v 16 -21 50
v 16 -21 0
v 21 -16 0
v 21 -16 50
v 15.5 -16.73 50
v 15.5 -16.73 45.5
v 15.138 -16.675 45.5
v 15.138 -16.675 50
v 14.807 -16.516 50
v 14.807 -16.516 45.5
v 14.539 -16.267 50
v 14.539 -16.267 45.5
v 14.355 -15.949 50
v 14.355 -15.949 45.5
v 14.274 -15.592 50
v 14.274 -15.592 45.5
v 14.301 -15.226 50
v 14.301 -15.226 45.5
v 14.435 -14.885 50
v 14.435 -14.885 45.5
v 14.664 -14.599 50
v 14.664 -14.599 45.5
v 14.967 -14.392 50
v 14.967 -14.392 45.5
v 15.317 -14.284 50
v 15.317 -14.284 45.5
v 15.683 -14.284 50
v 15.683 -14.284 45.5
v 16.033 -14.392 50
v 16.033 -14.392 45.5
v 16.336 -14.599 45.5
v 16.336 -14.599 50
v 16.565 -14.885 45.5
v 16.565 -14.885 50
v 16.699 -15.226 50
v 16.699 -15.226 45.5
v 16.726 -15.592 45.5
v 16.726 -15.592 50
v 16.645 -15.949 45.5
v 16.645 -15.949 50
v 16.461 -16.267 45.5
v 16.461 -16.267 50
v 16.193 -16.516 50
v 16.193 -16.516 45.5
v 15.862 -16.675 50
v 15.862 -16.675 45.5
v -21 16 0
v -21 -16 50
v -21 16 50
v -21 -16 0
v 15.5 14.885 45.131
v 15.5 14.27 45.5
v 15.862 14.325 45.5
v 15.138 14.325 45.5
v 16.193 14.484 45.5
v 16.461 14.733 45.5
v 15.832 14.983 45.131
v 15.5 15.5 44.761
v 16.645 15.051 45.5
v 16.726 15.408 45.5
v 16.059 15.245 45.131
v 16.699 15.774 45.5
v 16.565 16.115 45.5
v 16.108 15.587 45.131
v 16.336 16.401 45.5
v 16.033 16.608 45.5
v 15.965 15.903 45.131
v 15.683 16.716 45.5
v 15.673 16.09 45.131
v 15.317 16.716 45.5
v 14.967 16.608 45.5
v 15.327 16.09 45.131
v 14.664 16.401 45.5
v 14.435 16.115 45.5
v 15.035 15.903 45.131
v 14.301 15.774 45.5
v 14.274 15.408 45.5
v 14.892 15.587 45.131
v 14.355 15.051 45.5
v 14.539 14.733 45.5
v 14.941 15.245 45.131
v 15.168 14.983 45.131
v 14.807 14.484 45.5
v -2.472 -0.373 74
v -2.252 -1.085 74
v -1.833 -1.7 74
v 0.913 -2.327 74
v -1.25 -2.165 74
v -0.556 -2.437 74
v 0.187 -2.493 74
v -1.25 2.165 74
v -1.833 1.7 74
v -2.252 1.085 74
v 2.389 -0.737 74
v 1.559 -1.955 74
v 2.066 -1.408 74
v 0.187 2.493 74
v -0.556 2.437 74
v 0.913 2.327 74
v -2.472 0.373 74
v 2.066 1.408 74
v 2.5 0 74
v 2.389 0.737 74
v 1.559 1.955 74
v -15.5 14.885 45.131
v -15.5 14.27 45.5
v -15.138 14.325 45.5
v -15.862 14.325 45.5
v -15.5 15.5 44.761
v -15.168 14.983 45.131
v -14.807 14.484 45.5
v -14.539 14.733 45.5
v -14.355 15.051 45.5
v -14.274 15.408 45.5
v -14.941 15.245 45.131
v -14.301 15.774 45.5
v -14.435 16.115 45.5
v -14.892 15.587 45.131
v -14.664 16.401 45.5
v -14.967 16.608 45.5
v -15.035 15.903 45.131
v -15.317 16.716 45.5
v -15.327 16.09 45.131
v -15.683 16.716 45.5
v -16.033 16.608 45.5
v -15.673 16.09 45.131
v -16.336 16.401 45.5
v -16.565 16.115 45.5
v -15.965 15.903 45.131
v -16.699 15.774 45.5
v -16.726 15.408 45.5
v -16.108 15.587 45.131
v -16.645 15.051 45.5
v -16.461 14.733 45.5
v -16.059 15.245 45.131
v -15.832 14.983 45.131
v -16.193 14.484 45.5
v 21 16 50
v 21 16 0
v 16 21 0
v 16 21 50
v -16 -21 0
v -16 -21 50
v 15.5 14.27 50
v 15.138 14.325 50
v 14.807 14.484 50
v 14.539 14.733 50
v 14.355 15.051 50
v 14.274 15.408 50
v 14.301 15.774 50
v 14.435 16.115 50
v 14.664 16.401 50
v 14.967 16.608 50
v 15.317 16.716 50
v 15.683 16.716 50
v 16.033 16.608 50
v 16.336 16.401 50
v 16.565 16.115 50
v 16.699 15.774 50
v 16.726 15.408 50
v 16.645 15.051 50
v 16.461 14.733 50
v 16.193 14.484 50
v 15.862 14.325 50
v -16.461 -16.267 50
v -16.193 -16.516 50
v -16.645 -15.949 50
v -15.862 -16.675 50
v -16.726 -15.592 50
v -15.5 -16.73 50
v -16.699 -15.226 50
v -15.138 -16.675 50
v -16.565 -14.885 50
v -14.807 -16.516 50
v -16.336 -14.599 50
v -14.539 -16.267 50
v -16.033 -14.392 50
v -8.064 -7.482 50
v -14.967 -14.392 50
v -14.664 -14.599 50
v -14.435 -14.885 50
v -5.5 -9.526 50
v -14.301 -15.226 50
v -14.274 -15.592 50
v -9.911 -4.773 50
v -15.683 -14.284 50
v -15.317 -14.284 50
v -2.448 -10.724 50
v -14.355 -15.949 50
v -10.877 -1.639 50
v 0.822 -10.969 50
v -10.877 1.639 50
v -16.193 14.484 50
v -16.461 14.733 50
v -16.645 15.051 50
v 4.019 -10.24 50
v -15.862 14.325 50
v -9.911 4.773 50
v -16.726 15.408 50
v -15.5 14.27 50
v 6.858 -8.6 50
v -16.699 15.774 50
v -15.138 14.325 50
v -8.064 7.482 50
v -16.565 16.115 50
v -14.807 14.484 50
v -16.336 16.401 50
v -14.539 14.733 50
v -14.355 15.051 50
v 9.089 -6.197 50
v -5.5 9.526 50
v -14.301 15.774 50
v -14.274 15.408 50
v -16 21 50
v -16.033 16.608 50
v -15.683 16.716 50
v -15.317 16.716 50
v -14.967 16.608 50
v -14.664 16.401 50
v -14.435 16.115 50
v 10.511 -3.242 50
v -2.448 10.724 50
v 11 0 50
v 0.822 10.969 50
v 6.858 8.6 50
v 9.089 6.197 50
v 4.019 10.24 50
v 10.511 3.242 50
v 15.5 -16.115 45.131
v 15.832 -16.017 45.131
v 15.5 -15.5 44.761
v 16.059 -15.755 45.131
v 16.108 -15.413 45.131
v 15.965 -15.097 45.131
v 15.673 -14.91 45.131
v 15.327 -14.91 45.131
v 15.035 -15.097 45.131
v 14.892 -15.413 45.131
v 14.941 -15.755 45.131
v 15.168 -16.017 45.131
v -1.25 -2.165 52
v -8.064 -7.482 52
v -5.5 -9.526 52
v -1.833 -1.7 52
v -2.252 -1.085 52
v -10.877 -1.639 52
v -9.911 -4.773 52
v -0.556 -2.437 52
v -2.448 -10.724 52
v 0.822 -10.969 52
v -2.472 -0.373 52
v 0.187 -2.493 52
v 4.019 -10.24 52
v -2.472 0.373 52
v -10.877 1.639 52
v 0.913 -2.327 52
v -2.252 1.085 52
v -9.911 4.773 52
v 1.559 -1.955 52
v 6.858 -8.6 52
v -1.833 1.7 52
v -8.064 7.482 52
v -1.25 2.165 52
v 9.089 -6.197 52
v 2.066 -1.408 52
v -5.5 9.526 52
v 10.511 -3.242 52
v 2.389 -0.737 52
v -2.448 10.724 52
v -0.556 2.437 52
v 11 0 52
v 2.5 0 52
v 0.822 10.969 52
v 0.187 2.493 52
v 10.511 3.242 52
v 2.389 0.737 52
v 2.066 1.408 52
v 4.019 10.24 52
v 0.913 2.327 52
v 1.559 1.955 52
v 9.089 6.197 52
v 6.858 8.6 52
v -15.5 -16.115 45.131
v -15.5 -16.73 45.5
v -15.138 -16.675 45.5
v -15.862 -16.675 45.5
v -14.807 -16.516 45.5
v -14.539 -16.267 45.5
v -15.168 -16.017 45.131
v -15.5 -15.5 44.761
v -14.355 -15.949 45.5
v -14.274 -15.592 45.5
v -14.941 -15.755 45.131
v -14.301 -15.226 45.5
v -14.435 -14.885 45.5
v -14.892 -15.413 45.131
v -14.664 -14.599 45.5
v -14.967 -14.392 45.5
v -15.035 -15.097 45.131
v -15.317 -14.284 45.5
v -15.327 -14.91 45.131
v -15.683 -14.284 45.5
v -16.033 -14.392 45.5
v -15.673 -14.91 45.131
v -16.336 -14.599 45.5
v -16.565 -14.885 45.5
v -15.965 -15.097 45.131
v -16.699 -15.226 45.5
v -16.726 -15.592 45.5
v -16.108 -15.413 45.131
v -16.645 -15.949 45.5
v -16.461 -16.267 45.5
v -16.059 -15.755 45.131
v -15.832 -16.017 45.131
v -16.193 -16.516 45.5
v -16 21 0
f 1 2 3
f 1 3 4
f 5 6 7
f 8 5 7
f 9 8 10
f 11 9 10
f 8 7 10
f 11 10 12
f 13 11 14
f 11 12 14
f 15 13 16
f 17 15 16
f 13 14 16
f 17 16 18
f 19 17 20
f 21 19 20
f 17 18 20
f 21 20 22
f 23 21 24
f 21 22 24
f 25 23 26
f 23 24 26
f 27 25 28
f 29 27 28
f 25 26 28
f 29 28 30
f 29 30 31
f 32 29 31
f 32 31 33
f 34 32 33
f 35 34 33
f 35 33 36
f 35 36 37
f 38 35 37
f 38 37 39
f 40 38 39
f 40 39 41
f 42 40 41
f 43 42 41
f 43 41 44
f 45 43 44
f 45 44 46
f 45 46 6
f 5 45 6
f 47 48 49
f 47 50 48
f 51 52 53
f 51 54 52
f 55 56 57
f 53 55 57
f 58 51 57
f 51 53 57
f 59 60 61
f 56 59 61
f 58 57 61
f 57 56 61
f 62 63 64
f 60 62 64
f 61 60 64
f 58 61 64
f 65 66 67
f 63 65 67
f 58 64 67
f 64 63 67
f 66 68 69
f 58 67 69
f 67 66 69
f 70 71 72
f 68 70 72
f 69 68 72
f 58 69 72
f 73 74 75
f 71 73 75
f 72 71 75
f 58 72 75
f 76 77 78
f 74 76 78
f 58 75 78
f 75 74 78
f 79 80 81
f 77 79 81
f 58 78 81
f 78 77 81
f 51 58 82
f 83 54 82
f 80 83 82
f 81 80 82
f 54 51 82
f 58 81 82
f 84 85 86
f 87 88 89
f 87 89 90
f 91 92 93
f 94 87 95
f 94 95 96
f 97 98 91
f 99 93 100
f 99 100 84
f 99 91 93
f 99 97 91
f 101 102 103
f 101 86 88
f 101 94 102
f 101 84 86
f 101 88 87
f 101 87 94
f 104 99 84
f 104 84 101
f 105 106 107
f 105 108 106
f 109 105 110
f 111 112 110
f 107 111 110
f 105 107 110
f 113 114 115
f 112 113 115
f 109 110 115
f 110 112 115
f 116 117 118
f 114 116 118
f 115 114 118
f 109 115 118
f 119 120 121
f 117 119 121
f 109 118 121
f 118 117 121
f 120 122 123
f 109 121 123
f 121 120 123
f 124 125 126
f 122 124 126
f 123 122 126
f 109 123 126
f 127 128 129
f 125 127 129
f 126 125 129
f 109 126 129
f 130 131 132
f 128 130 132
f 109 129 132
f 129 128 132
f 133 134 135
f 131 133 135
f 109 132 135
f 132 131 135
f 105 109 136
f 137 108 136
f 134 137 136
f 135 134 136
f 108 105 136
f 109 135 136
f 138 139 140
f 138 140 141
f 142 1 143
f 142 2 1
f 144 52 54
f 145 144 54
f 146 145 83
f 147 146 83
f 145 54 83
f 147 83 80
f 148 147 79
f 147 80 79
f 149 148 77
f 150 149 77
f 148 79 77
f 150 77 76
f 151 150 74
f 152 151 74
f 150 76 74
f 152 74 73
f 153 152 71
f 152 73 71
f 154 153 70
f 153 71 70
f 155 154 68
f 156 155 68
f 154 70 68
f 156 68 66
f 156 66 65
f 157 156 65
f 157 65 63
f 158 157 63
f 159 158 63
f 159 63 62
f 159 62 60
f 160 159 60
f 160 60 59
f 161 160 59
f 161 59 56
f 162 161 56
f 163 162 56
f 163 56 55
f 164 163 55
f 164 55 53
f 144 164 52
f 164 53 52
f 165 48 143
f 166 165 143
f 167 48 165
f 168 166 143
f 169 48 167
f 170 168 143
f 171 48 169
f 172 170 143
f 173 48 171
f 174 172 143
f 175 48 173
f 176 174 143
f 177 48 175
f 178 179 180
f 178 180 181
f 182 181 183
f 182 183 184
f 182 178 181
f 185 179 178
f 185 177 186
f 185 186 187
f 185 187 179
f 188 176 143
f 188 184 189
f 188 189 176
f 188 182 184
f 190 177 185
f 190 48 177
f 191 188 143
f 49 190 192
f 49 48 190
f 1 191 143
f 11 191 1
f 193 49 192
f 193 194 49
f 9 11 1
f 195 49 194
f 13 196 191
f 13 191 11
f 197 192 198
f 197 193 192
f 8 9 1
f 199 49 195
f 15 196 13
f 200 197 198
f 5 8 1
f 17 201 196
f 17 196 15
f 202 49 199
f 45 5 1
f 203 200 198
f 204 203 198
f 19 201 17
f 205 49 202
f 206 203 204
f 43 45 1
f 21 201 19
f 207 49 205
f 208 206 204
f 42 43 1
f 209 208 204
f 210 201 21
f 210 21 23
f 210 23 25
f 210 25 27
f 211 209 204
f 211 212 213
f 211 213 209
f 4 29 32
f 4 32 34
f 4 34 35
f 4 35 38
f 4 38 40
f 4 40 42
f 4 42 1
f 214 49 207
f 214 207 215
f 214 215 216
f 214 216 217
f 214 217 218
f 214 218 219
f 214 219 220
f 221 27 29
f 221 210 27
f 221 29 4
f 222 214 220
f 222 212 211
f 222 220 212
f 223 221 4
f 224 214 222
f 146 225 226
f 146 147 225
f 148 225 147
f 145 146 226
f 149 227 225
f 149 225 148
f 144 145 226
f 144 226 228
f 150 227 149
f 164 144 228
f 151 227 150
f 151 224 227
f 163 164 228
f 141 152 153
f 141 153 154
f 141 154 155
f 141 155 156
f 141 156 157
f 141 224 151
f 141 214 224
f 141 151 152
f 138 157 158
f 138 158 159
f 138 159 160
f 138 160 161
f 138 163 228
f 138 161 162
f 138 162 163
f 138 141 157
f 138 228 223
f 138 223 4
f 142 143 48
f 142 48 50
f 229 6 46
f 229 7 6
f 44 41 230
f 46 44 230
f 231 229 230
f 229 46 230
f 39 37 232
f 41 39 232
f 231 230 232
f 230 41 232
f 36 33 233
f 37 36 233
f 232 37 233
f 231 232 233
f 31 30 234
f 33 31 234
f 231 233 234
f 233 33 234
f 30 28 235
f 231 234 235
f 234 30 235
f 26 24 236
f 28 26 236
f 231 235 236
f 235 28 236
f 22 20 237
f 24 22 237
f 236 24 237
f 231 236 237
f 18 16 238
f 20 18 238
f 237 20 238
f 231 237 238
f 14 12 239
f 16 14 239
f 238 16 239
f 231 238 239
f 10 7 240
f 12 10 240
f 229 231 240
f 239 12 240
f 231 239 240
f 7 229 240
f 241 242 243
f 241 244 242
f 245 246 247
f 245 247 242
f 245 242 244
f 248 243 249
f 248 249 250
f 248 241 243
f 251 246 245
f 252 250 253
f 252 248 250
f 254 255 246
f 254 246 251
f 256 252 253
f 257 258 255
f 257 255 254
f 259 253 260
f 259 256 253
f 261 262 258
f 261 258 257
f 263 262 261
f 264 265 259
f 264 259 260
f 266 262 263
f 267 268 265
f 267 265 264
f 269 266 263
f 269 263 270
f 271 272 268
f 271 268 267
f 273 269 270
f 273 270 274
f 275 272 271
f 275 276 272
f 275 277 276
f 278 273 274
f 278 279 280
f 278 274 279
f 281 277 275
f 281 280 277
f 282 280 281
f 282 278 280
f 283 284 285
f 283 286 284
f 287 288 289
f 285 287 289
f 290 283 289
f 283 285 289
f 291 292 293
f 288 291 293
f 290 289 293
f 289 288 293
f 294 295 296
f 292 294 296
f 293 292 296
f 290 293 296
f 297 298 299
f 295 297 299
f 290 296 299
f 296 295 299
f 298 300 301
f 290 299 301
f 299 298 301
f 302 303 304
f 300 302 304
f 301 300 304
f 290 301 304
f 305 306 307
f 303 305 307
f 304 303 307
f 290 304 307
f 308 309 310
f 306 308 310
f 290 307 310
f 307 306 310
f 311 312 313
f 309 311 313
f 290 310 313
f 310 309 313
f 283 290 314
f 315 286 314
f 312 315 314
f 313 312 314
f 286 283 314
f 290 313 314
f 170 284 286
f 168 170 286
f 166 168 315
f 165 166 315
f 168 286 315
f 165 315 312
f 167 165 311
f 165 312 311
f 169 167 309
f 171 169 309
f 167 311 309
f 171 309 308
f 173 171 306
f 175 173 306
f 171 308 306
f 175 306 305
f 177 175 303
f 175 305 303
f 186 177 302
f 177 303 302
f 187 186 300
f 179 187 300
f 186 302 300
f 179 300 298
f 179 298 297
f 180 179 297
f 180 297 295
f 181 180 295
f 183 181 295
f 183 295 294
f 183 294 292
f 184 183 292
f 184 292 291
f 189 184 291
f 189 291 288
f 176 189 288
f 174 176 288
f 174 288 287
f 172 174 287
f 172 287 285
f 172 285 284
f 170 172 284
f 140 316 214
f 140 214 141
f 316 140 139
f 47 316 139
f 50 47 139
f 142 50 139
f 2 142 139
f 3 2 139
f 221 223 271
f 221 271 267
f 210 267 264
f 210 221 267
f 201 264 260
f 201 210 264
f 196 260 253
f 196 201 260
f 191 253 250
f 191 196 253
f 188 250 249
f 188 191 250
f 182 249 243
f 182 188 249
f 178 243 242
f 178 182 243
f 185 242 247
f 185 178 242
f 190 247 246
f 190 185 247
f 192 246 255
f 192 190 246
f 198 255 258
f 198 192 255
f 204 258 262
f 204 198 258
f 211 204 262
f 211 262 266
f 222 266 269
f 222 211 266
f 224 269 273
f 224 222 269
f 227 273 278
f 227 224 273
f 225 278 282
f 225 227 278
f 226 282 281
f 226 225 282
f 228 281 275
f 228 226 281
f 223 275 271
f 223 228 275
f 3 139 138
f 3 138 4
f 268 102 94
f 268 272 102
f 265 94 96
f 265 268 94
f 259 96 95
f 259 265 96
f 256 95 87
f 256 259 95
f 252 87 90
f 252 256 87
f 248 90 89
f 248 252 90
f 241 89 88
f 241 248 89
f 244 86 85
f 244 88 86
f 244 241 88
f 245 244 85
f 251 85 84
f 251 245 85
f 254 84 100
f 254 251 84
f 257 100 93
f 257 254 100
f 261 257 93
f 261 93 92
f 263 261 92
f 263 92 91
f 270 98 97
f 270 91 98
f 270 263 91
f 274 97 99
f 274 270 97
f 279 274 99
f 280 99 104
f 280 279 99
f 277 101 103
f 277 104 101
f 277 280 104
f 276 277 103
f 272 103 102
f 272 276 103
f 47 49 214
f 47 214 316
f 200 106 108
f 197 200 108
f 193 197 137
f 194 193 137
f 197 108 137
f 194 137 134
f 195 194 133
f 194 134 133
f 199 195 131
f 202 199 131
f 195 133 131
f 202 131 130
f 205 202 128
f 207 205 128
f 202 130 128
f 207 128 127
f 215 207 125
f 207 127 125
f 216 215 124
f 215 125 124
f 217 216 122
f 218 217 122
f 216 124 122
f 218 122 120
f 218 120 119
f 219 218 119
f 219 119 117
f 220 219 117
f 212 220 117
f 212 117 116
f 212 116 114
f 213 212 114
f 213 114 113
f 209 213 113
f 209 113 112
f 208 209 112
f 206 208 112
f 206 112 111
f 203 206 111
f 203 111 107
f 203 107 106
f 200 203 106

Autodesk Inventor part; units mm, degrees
ref_plane "YZ Plane" through (0, 0, 0) normal (1, 0, 0) x (0, 1, 0)
ref_plane "XZ Plane" through (0, 0, 0) normal (0, 1, 0) x (-1, 0, 0)
ref_plane "XY Plane" through (0, 0, 0) normal (0, 0, 1) x (1, 0, 0)
sketch "Skizze1" plane through (0, 0, 0) normal (0, 0, 1) x (1, 0, 0)
  line L0 (-21, 21) -> (21, 21)
  line L1 (21, 21) -> (21, -21)
  line L2 (21, -21) -> (-21, -21)
  line L3 (-21, -21) -> (-21, 21)
  line L4 (-29.4, 0) -> (29.4, 0) projected
  line L5 (0, -29.4) -> (0, 29.4) projected
  point P0 (0, 0)
  dimension "d0" = 42
  dimension "d1" = 42
extrude "Extrusion1" add sketch "Skizze1" along normal blind 50
sketch "Skizze2" plane through (0, 0, 50) normal (0, 0, 1) x (1, 0, 0)
  circle A0 centre (0, 0) radius 11
  dimension "d4" = 22
extrude "Extrusion2" add sketch "Skizze2" along normal blind 2
sketch "Skizze3" plane through (0, 0, 52) normal (0, 0, 1) x (1, 0, 0)
  circle A0 centre (0, 0) radius 11 projected
  circle A1 centre (0, 0) radius 2.5
  dimension "d7" = 5
extrude "Extrusion3" add sketch "Skizze3" along normal blind 22 contours A1
chamfer "Fase1" distance 5 angle 45 4 edges at (-21, -21, 25) (21, -21, 25) (21, 21, 25) (-21, 21, 25)
sketch "Skizze4" plane through (0, 0, 50) normal (0, 0, 1) x (1, 0, 0)
  line L0 (-15.5, 15.5) -> (15.5, 15.5)
  line L1 (15.5, 15.5) -> (15.5, -15.5)
  line L2 (15.5, -15.5) -> (-15.5, -15.5)
  line L3 (-15.5, -15.5) -> (-15.5, 15.5)
  line L4 (-29.4, 0) -> (29.4, 0) projected
  line L5 (0, -29.4) -> (0, 29.4) projected
  dimension "d13" = 31
hole "Bohrung1" at (-15.5, 15.5, 50) at (15.5, 15.5, 50) at (15.5, -15.5, 50) at (-15.5, -15.5, 50) direction (0, 0, -1) diameter 2.459 depth 4.5 tip angle 118 thread size "M3x0.5" class "6H" standard "ISO Metric profile"
properties part number "Motor"
